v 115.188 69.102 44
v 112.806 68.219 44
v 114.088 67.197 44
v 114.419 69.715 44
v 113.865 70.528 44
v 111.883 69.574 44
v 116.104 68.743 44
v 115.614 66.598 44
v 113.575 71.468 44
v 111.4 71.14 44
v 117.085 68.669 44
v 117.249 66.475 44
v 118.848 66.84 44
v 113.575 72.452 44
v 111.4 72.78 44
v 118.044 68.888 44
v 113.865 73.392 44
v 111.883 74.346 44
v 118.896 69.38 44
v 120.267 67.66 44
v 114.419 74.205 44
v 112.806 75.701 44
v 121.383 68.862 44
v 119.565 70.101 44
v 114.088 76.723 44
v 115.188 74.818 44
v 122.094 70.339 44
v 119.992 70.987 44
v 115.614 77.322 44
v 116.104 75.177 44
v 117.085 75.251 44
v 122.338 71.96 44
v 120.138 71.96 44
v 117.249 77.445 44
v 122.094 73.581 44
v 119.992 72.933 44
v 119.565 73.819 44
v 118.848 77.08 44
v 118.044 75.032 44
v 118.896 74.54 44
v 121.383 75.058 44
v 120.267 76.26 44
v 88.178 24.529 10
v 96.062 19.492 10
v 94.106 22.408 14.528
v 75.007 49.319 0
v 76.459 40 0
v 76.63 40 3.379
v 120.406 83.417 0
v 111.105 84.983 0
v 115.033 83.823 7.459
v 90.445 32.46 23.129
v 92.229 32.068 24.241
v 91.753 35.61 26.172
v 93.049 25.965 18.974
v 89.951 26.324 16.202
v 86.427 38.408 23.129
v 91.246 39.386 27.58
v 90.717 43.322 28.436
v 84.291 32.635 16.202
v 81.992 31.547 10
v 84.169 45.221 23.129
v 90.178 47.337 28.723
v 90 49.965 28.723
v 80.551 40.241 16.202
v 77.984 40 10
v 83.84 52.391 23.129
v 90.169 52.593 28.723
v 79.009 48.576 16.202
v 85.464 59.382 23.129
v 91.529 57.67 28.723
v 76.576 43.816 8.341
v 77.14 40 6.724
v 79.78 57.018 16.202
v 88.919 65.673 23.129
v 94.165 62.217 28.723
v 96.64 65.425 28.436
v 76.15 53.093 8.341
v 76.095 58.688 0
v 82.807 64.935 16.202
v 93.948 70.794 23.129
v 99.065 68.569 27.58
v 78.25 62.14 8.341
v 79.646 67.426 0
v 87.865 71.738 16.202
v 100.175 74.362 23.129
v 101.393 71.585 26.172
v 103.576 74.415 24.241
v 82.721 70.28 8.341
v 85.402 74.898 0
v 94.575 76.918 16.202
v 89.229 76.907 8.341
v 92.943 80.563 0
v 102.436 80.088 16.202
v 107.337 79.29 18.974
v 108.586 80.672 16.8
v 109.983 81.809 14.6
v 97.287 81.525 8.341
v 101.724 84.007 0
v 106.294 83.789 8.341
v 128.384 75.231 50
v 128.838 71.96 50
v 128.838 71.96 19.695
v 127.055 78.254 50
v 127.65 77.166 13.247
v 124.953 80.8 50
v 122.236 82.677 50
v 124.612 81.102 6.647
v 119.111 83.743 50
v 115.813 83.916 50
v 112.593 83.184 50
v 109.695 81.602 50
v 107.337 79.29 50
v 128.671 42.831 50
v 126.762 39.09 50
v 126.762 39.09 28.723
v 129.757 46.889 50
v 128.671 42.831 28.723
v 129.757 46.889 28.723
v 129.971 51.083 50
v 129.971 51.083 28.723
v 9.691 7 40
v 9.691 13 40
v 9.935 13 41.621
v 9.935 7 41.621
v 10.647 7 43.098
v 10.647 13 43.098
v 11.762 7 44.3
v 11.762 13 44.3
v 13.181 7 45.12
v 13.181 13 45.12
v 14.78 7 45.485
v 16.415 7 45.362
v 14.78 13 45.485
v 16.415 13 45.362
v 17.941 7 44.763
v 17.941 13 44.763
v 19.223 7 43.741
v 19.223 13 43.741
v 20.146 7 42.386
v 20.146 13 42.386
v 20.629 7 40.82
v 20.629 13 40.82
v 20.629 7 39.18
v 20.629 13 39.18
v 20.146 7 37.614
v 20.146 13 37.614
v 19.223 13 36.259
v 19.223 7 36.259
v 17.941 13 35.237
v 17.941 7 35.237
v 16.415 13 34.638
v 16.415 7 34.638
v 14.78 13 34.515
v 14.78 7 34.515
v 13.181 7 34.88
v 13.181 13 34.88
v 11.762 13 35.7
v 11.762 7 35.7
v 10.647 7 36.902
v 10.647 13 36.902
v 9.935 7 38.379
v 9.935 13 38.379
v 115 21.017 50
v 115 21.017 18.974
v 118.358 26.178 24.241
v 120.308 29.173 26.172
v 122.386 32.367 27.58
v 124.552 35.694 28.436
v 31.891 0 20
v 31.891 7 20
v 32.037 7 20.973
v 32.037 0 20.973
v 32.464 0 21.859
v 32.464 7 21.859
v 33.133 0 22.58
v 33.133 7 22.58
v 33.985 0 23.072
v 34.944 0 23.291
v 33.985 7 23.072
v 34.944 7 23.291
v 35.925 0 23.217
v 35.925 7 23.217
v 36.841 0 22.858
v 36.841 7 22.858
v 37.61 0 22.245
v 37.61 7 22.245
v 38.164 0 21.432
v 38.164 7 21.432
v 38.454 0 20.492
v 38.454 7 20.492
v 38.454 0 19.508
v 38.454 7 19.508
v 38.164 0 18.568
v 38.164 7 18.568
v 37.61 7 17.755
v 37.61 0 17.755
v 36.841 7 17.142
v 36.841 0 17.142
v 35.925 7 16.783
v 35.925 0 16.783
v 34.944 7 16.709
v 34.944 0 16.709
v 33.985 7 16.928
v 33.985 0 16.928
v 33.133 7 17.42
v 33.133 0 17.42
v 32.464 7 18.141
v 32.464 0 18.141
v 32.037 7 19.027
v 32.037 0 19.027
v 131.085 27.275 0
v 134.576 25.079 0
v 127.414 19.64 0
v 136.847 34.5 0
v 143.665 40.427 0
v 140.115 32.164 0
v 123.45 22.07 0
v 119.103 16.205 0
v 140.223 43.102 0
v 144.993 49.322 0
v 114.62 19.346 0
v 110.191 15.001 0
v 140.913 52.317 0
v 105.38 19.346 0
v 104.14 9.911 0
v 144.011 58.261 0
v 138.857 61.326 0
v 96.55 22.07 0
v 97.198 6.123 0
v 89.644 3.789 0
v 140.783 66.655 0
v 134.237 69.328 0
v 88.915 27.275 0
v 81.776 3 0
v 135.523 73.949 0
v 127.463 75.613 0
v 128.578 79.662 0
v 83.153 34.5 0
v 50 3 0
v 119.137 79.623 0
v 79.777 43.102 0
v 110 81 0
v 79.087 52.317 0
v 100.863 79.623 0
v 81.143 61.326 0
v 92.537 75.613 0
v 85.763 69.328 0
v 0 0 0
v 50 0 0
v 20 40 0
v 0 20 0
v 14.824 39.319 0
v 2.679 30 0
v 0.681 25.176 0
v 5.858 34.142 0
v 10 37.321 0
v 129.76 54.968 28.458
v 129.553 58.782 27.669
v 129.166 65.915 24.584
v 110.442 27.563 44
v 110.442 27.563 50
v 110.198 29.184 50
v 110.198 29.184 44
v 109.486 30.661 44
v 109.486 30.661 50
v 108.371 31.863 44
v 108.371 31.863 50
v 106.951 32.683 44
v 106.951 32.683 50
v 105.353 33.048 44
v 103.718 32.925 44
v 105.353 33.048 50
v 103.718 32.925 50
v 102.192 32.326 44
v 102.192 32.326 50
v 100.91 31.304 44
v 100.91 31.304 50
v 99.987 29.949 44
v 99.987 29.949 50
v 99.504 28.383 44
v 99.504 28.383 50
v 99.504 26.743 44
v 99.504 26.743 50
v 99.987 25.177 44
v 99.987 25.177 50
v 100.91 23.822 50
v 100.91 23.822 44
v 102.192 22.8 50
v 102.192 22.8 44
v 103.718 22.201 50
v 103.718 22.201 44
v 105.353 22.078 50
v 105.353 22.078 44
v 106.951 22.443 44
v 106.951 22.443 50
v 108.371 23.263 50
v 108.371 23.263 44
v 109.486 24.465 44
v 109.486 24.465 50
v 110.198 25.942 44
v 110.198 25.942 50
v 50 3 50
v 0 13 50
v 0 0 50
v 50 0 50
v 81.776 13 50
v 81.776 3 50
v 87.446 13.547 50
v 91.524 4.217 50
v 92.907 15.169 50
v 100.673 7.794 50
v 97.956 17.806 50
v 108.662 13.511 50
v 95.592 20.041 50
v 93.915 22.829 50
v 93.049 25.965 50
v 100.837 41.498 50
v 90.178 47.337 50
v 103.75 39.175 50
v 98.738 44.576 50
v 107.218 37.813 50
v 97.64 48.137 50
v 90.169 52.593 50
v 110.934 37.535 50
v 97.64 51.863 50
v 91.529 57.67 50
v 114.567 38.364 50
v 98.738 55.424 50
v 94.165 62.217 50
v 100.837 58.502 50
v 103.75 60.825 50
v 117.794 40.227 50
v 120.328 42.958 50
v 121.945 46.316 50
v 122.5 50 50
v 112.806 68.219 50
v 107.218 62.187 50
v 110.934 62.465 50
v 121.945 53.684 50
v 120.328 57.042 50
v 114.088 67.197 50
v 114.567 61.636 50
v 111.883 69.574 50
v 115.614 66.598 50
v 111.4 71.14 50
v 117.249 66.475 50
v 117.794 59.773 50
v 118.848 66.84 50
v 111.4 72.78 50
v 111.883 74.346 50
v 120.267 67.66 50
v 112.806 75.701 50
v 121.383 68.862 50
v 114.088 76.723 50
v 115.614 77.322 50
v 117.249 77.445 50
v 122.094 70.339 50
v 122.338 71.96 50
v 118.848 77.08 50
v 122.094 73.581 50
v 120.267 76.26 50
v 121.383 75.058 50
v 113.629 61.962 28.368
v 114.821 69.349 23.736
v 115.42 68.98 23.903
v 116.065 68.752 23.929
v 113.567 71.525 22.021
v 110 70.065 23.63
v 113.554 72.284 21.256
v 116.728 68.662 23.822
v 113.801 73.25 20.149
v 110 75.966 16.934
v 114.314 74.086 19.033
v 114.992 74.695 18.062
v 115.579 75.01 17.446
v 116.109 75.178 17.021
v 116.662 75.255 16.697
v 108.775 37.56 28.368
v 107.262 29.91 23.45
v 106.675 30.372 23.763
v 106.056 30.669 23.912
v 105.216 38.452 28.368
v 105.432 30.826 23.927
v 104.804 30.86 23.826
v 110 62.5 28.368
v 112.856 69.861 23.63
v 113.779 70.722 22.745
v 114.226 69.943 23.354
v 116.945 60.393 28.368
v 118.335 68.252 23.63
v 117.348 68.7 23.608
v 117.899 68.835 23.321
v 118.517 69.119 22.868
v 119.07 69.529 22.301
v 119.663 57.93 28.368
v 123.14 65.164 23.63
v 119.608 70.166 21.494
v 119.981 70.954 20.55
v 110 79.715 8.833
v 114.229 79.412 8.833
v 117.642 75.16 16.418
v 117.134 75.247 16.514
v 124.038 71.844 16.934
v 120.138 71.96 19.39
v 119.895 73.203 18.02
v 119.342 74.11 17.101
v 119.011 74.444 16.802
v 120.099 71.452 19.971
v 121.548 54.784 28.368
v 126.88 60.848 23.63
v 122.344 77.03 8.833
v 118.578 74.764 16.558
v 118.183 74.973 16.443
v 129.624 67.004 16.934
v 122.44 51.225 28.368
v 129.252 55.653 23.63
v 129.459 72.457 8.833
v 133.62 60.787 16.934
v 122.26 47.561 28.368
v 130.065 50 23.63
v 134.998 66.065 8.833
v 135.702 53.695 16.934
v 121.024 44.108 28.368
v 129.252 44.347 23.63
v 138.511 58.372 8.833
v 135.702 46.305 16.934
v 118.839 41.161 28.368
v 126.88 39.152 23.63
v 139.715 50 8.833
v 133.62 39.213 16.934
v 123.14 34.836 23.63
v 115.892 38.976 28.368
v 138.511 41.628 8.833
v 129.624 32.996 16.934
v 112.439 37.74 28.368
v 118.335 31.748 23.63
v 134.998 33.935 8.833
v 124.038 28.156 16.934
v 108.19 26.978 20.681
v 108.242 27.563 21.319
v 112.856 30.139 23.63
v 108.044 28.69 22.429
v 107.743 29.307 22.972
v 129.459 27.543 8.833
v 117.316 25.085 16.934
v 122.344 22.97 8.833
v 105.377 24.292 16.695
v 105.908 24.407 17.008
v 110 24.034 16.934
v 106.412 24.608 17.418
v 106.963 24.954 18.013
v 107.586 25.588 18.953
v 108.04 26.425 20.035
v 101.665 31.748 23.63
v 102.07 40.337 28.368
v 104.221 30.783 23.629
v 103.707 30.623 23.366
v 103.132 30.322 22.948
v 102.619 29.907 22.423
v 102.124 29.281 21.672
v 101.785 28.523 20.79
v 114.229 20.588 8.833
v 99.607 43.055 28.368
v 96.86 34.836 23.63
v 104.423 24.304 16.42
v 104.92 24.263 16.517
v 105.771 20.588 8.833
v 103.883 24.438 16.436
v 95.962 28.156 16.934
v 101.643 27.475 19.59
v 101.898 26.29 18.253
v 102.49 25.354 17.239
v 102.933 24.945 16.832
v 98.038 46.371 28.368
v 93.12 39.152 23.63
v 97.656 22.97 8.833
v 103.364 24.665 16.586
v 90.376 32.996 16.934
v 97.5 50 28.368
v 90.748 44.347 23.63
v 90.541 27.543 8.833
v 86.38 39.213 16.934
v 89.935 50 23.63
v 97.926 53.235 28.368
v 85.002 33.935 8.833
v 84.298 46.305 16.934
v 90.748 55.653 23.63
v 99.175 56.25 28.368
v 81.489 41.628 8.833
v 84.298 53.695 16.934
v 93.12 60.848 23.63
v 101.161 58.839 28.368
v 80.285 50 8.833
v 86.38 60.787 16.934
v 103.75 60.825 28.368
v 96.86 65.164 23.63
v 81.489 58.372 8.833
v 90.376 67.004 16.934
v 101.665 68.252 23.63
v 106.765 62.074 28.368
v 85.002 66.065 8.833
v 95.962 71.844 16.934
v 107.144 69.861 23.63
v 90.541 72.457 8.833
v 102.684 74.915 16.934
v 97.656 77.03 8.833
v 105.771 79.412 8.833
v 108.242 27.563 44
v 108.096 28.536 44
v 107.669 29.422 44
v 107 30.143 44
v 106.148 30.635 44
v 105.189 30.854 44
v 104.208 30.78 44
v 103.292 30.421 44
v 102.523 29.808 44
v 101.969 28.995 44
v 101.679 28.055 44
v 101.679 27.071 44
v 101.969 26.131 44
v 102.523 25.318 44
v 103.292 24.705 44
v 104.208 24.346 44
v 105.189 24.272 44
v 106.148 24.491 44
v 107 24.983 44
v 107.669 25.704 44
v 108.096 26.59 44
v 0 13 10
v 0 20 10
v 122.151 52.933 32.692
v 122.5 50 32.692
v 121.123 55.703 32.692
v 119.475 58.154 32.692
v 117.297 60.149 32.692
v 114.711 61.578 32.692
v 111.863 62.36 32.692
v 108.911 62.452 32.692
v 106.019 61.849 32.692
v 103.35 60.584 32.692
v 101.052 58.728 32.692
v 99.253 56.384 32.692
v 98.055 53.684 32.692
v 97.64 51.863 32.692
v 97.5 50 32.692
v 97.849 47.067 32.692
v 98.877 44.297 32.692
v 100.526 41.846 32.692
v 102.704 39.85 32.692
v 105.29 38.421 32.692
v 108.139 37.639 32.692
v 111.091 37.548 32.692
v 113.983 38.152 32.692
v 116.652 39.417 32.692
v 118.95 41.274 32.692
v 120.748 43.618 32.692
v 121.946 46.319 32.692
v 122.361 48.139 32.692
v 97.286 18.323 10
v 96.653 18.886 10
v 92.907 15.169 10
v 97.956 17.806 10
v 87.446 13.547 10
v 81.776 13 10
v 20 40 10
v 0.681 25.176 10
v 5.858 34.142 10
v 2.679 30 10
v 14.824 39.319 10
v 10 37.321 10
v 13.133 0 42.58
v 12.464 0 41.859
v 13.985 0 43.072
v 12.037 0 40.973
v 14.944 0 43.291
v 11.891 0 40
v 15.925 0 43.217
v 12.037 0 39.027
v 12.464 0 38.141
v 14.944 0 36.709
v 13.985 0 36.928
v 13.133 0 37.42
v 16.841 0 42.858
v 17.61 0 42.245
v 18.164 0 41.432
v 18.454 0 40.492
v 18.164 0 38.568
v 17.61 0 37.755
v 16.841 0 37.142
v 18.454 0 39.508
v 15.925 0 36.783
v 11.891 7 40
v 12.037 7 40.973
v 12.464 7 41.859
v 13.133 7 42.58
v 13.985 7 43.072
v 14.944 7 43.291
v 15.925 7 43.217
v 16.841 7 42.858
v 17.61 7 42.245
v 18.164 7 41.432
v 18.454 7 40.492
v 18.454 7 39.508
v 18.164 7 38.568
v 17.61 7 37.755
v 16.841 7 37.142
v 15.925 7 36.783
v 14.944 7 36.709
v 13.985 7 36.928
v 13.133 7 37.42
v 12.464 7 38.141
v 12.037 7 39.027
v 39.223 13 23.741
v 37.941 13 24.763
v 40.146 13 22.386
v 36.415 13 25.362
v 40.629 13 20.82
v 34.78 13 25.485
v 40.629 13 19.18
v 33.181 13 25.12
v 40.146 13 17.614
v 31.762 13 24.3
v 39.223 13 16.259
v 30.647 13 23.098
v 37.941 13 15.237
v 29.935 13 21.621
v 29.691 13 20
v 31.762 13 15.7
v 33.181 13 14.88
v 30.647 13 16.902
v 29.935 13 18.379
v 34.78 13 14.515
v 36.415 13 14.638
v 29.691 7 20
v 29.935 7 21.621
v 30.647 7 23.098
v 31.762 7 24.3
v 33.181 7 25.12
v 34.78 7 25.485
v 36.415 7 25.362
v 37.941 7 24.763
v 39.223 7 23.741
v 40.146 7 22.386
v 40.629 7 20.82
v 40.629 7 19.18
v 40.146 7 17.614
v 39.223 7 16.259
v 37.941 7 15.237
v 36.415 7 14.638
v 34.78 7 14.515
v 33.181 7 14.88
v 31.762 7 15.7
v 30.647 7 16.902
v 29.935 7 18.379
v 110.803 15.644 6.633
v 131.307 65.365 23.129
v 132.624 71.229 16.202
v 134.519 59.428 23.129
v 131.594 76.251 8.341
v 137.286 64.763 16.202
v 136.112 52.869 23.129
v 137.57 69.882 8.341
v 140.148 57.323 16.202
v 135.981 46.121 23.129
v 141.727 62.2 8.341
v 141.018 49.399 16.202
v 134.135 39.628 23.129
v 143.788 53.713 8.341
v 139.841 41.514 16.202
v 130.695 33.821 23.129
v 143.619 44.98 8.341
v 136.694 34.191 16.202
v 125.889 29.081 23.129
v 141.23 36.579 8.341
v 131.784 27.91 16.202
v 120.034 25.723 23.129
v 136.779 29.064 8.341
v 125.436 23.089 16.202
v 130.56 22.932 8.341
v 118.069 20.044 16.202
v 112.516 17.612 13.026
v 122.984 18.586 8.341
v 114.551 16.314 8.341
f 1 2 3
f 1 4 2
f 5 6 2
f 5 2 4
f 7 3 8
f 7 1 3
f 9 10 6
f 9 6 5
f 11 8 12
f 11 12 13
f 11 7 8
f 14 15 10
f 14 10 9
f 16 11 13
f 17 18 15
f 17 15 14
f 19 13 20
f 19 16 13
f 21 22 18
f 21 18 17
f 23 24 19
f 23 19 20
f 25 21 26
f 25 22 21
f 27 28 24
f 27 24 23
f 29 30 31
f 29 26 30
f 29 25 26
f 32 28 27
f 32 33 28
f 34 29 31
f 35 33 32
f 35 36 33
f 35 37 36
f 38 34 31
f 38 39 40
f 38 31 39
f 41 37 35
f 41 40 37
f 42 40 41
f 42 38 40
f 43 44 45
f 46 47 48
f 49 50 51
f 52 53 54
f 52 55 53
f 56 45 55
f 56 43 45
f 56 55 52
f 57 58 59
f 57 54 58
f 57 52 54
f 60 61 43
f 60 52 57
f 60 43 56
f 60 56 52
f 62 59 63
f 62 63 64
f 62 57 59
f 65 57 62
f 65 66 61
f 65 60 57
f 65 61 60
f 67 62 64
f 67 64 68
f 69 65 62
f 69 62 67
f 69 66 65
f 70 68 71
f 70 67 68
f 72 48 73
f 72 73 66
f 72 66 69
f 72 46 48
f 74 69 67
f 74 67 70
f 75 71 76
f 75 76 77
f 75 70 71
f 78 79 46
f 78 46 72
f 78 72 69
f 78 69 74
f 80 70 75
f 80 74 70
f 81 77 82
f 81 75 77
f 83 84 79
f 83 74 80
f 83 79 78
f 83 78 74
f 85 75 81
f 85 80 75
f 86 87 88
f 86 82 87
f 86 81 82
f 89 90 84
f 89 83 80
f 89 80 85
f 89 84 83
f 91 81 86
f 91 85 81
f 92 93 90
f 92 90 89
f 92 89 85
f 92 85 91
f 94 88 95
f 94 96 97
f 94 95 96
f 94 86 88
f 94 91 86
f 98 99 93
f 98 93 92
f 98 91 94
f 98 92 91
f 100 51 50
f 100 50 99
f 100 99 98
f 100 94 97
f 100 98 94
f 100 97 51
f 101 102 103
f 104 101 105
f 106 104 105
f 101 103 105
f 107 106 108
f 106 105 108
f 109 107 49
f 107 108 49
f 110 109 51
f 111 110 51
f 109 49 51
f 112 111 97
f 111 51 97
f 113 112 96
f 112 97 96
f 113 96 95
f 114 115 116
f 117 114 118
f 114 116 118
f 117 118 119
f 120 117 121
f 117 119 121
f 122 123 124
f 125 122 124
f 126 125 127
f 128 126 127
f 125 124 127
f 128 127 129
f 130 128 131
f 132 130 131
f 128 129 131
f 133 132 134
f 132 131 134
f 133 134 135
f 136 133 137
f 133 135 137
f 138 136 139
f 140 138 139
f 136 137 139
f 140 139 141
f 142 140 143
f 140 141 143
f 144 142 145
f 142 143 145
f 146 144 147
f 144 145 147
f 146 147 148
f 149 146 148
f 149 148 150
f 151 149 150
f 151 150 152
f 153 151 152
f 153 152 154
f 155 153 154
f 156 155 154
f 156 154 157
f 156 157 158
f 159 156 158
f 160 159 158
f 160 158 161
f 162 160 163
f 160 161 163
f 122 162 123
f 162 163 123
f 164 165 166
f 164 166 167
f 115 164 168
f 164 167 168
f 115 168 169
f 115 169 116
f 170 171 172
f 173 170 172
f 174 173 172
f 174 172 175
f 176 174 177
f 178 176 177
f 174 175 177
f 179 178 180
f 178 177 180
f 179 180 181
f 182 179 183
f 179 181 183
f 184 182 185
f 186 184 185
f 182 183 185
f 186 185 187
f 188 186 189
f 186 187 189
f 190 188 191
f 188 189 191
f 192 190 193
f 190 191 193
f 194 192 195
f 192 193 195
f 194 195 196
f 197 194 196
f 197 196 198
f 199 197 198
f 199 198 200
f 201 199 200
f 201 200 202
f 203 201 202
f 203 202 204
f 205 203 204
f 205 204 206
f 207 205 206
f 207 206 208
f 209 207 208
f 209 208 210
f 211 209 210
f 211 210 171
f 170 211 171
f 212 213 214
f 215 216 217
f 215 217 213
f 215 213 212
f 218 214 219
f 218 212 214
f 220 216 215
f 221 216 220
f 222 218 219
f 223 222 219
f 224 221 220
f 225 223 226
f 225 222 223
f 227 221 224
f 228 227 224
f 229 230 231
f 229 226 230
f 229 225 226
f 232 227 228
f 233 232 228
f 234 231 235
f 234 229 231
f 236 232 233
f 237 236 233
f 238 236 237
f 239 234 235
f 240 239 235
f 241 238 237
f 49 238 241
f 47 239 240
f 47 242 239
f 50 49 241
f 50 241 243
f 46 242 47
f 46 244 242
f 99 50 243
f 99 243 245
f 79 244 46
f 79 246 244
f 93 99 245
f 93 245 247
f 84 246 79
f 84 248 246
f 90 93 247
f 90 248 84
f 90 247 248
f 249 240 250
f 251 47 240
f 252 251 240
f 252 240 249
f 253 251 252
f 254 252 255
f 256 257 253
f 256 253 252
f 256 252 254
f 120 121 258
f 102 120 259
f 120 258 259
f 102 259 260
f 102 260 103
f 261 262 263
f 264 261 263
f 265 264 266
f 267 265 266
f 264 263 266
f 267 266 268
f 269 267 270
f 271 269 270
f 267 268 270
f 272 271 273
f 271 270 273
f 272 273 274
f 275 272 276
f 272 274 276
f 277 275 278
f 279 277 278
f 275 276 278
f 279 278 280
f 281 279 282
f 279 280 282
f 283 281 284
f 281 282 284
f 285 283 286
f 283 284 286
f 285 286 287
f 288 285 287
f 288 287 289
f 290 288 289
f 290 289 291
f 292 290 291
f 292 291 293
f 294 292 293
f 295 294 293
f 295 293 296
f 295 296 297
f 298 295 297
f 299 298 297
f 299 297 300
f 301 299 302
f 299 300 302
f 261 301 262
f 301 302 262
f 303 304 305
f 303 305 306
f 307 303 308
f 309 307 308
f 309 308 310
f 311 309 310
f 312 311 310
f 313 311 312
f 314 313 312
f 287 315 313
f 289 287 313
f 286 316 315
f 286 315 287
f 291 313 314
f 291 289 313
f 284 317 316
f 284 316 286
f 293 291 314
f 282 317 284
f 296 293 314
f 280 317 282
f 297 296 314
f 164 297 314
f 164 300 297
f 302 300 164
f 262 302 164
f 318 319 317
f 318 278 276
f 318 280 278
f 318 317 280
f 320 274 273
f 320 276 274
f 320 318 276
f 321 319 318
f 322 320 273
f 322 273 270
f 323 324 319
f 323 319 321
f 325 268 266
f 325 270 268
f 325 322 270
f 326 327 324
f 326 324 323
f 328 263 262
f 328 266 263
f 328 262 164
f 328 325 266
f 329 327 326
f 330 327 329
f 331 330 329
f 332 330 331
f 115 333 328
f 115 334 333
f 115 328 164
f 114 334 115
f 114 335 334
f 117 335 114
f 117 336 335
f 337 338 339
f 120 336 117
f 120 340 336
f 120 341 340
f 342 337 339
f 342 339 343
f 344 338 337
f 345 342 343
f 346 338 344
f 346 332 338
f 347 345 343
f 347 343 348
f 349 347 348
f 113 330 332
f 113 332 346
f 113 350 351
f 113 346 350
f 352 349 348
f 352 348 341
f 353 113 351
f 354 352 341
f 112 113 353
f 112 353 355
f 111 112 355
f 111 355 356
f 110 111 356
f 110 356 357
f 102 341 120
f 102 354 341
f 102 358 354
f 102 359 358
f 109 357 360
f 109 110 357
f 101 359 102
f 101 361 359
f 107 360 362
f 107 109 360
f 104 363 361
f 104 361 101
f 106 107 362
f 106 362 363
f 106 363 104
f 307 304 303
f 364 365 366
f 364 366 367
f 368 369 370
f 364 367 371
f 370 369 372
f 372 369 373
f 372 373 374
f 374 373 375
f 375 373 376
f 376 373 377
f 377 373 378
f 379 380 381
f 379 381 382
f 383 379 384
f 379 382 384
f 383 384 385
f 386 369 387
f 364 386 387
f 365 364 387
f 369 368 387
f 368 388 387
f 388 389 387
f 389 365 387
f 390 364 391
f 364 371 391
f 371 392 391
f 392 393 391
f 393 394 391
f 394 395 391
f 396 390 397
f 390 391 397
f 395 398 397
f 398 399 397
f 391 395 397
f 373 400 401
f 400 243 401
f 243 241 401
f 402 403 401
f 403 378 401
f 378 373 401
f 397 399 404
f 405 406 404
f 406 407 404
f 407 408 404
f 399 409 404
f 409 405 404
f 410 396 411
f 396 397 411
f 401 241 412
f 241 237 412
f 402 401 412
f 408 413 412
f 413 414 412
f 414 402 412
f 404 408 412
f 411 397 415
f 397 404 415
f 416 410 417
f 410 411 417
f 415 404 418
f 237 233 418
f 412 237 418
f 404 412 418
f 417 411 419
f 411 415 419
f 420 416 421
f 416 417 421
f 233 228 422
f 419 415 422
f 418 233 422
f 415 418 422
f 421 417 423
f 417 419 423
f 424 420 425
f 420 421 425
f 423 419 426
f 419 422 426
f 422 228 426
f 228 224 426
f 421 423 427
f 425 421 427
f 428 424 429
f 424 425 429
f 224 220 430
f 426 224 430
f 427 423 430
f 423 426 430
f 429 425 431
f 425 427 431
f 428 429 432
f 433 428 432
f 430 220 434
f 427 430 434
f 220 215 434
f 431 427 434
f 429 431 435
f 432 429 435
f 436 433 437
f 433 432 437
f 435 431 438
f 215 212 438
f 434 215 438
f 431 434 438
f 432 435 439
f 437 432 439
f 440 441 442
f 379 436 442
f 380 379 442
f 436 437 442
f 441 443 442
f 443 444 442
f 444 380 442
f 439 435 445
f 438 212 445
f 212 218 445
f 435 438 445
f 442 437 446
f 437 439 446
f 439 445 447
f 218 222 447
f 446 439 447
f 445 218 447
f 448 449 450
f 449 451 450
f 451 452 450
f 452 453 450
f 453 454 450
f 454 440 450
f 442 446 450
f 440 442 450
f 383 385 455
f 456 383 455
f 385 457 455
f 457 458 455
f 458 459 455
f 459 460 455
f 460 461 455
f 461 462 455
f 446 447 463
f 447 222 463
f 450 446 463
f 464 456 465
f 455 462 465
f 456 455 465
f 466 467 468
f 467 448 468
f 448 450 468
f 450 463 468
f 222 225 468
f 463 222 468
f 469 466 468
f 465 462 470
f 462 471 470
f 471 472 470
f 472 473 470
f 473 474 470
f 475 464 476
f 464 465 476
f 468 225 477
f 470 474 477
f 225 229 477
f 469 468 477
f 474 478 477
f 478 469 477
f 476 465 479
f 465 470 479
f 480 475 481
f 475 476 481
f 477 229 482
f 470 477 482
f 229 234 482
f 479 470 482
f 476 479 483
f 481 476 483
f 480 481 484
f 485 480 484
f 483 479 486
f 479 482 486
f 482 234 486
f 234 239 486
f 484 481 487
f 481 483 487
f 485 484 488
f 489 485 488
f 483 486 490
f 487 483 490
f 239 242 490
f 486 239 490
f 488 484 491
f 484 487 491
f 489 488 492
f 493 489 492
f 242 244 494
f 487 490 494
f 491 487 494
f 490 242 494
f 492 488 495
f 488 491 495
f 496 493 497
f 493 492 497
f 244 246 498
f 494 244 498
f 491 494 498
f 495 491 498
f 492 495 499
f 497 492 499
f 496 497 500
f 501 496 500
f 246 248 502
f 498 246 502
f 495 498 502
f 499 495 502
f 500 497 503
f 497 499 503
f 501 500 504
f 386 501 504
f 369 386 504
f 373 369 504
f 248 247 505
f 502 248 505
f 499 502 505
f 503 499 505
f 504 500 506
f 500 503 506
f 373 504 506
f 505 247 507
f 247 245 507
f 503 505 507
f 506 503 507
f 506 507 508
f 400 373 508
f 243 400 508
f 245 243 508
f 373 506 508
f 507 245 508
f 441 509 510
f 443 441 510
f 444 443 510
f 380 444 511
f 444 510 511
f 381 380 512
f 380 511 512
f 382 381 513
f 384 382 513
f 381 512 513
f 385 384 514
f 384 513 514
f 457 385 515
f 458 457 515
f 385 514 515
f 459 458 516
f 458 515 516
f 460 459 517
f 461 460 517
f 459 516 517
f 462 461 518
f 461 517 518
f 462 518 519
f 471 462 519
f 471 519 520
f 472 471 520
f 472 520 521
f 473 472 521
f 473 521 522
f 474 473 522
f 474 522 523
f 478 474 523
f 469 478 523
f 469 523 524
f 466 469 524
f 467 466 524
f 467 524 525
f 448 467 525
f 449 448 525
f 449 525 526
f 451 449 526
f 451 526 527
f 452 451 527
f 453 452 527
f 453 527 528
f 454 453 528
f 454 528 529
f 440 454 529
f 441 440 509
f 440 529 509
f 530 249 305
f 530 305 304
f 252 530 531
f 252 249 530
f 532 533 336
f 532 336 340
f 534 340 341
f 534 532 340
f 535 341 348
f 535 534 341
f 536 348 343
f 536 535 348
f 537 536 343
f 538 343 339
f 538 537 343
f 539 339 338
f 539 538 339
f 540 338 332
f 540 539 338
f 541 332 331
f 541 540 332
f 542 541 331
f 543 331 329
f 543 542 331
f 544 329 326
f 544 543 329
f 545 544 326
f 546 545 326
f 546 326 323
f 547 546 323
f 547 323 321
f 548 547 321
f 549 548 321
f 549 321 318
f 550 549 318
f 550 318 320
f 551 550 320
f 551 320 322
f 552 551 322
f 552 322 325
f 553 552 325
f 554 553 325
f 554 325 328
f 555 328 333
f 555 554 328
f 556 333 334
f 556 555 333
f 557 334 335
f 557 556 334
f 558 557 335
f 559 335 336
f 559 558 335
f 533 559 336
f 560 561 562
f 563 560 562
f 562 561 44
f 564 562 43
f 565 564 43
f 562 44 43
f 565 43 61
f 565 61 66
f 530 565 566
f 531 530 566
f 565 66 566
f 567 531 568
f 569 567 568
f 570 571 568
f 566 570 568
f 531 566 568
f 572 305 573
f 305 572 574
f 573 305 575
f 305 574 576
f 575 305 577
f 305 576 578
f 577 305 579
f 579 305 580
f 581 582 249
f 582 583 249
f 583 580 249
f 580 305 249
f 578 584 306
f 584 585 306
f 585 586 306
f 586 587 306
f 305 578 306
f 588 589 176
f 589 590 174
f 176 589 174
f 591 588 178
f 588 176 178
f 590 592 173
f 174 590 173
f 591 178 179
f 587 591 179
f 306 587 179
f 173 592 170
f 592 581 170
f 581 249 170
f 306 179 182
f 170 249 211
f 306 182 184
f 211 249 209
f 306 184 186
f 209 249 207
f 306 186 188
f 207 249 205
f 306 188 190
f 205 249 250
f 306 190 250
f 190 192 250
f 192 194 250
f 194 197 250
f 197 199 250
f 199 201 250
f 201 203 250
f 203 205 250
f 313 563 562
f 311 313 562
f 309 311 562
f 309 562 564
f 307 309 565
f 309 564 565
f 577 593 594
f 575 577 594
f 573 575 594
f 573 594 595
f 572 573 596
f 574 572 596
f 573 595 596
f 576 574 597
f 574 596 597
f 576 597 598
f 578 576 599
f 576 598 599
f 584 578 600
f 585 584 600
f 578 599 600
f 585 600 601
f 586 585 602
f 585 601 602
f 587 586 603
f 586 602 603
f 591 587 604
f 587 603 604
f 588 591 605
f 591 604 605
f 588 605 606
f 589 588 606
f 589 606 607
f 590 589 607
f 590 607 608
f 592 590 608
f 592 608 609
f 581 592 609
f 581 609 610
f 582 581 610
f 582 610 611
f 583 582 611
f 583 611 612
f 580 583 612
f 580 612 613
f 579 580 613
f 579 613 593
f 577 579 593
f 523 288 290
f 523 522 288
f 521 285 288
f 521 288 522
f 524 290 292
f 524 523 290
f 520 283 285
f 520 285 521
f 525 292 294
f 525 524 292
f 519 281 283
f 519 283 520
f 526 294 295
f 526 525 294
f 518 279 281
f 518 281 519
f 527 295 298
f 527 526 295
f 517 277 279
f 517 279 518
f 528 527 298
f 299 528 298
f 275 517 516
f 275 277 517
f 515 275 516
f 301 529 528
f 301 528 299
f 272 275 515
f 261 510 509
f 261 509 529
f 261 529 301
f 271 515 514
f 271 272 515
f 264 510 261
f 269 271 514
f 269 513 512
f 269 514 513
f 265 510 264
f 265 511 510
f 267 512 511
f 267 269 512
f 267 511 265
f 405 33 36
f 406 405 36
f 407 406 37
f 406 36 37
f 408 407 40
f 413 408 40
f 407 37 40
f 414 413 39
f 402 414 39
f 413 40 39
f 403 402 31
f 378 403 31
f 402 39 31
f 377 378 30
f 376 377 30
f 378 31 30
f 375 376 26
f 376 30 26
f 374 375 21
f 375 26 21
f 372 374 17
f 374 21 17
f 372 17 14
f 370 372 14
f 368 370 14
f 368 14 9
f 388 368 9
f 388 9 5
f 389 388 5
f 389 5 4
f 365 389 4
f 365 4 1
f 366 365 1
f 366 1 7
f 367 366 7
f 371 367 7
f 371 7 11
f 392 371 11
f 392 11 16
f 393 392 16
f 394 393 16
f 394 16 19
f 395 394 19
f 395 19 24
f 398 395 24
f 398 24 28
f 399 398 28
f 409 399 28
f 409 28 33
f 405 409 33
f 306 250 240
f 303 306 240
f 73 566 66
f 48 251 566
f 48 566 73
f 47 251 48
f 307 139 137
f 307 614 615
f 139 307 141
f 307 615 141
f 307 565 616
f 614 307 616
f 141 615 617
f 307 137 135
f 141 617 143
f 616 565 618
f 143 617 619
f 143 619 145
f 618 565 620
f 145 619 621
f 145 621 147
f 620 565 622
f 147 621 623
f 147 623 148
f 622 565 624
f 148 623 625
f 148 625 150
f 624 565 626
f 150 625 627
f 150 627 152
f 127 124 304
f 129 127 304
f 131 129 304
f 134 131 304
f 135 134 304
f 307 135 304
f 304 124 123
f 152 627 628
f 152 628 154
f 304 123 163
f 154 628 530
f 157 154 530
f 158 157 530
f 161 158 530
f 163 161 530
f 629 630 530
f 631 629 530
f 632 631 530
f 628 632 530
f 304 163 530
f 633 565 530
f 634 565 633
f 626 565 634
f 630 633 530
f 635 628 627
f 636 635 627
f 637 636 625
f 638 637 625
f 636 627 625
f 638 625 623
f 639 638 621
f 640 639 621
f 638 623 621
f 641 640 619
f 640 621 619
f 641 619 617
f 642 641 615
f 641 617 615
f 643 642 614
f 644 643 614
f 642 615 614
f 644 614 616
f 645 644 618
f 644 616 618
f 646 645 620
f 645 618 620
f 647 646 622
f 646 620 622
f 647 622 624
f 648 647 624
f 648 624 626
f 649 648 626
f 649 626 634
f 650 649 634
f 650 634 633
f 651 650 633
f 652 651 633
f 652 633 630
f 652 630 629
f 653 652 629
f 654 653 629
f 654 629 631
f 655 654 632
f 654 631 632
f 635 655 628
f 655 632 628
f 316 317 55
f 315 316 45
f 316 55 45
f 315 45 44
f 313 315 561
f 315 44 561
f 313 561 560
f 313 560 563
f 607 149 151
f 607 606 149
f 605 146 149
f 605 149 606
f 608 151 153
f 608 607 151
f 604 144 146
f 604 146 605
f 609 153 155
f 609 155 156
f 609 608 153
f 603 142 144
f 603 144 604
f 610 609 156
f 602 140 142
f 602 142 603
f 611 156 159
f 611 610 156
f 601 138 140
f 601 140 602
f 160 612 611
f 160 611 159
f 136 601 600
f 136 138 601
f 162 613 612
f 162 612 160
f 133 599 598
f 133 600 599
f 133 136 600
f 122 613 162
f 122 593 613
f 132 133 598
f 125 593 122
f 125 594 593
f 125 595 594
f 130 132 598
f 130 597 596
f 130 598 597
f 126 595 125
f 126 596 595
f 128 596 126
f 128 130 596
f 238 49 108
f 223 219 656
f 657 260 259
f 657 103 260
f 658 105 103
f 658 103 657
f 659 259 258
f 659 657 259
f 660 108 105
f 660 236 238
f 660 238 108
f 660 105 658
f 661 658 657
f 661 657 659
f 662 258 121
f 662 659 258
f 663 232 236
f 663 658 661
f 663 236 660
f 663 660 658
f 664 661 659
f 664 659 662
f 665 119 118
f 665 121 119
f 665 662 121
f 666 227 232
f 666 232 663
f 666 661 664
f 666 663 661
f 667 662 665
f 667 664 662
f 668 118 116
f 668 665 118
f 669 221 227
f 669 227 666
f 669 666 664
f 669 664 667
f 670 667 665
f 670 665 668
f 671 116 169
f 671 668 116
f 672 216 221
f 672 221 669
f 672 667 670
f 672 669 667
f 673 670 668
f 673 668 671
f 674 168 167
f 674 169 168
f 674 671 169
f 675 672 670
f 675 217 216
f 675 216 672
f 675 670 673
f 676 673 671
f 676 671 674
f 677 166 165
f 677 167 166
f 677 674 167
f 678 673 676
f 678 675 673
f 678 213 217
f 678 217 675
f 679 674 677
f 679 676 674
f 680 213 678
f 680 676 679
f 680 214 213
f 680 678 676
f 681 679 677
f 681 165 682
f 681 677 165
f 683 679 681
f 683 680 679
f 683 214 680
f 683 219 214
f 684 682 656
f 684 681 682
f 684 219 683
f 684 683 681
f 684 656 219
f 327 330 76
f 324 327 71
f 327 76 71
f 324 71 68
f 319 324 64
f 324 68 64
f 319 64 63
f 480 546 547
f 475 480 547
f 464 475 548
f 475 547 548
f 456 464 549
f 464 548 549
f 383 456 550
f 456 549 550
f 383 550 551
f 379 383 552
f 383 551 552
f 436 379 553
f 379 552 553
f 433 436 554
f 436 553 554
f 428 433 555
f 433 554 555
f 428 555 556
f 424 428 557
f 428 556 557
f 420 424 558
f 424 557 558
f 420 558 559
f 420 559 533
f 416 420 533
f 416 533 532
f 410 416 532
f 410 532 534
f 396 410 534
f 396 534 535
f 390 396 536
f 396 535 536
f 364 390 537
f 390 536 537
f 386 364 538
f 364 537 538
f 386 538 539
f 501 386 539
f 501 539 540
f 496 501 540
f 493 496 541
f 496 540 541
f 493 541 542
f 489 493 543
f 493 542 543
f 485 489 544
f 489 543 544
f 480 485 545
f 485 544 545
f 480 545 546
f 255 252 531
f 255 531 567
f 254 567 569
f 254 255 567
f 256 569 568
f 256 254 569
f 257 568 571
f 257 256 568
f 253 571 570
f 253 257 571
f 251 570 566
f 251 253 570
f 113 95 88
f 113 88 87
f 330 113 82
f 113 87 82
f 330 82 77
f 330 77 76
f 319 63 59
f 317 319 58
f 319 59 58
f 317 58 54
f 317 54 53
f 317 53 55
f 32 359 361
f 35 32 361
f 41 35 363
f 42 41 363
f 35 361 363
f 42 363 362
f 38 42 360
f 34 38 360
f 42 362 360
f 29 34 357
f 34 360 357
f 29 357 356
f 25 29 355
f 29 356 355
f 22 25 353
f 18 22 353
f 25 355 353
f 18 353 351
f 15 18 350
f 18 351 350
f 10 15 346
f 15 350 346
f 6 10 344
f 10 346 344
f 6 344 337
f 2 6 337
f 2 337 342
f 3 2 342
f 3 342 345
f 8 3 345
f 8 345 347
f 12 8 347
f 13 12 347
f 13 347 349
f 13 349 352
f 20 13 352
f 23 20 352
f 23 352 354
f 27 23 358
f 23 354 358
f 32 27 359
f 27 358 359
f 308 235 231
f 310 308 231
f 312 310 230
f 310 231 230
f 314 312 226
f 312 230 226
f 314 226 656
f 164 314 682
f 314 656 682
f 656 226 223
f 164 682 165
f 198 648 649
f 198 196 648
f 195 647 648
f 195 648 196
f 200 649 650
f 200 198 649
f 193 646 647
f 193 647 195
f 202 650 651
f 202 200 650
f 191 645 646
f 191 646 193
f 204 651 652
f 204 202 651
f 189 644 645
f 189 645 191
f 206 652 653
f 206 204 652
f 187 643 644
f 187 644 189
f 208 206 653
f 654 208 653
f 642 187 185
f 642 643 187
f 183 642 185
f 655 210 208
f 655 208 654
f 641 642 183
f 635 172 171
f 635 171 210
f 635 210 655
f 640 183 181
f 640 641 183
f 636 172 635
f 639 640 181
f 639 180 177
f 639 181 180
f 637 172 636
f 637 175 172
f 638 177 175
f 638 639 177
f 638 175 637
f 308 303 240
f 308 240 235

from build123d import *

# Parameters (mm, degrees)
SKETCH1_R               = 12.5
SKETCH1_R_2             = 5.5
BOSS_EXTRUDE1_DEPTH     = 50
SKETCH3_R               = 5.5
CUT_EXTRUDE2_DEPTH      = 6
BOSS_EXTRUDE2_DEPTH     = 10
CUT_EXTRUDE3_REACH      = 177.357
CUT_EXTRUDE3_END_RADIUS = 31
SKETCH8_R               = 12.5
SKETCH8_R_2             = 3.3
SKETCH9_R               = 5.5
CUT_EXTRUDE4_DEPTH      = 6
SKETCH11_R              = 3.3
CUT_EXTRUDE5_DEPTH      = 170.437304068


with BuildPart() as part:
    # Sketch1 → Boss-Extrude1 (new body)
    # profile 1 of 3: a face of its own
    with BuildSketch(Plane.XY):
        with BuildLine():
            ThreePointArc((93.048941287, 25.965408086), (94.65877554, 21.378133023), (97.956410185, 17.805981771))
            ThreePointArc((97.956410185, 17.805981771), (90.215500805, 14.226887077), (81.775930618, 13))
            Line((81.775930618, 13), (0, 13))
            Line((0, 13), (0, 0))
            Line((0, 0), (50, 0))
            Line((50, 0), (50, 3))
            Line((50, 3), (81.775930618, 3))
            ThreePointArc((81.775930618, 3), (100.673195021, 7.794200226), (114.99953828, 21.017166857))
            Line((114.99953828, 21.017166857), (126.762369546, 39.090235236))
            ThreePointArc((126.762369546, 39.090235236), (129.32062945, 44.831511086), (129.970641881, 51.083264917))
            Line((129.970641881, 51.083264917), (128.838231587, 71.959931438))
            ThreePointArc((128.838231587, 71.959931438), (120.710453355, 83.318007797), (107.33724849, 79.290096524))
            Line((107.33724849, 79.290096524), (94.165028172, 62.21694181))
            ThreePointArc((94.165028172, 62.21694181), (90.681483474, 55.176380902), (90.178041223, 47.33730395))
            Line((90.178041223, 47.33730395), (93.048941287, 25.965408086))
        make_face()
        with Locations((110, 50)):
            Circle(SKETCH1_R, mode=Mode.SUBTRACT)
        with Locations((116.838231587, 71.959931438)):
            Circle(SKETCH1_R_2, mode=Mode.SUBTRACT)
        with Locations((104.942116553, 27.563025716)):
            Circle(SKETCH1_R_2, mode=Mode.SUBTRACT)
    # profile 2 of 3: a face of its own
    with BuildSketch(Plane.XY):
        with Locations((116.838231587, 71.959931438)):
            Circle(SKETCH1_R_2)
    # profile 3 of 3: a face of its own
    with BuildSketch(Plane.XY):
        with Locations((104.942116553, 27.563025716)):
            Circle(SKETCH1_R_2)
    extrude(amount=BOSS_EXTRUDE1_DEPTH)

    # Sketch3 → Cut-Extrude2 (cut)
    with BuildSketch(Plane.XY.offset(50)):
        with Locations((116.838231587, 71.959931438)):
            Circle(SKETCH3_R)
        with Locations((104.942116553, 27.563025716)):
            Circle(SKETCH3_R)
    extrude(amount=-CUT_EXTRUDE2_DEPTH, mode=Mode.SUBTRACT)

    # Sketch5 → Boss-Extrude2 (add)
    with BuildSketch(Plane(origin=(0, 0, 0), x_dir=(-1, 0, 0), z_dir=(0, 0, -1))):
        with BuildLine():
            Line((-81.775930618, 13), (0, 13))
            Line((0, 13), (0, 20))
            ThreePointArc((0, 20), (-5.857864376, 34.142135624), (-20, 40))
            Line((-20, 40), (-76.458980338, 40))
            Line((-76.458980338, 40), (-80.657198498, 40))
            Line((-80.657198498, 40), (-91.163665826, 40))
            Line((-91.163665826, 40), (-93.048941287, 25.965408086))
            ThreePointArc((-93.048941287, 25.965408086), (-94.65877554, 21.378133023), (-97.956410185, 17.805981771))
            ThreePointArc((-97.956410185, 17.805981771), (-90.215500805, 14.226887077), (-81.775930618, 13))
        make_face()
    extrude(amount=-BOSS_EXTRUDE2_DEPTH)

    # Sketch6 → Revolve2 (revolve)
    with BuildSketch(Plane.ZY.offset(-110), mode=Mode.PRIVATE) as revolve2_sk:
        with BuildLine():
            ThreePointArc((31, 50), (21.920310217, 71.920310217), (0, 81))
            Line((0, 81), (0, 50))
            Line((0, 50), (31, 50))
        make_face()
        with BuildLine():
            Line((0, 85), (0, 81))
            ThreePointArc((0, 81), (21.920310217, 71.920310217), (31, 50))
            Line((31, 50), (35, 50))
            ThreePointArc((35, 50), (24.748737342, 74.748737342), (0, 85))
        make_face()
    revolve(revolve2_sk.sketch.rotate(Axis((110, 50, 35), (0, 0, -1)), 270), axis=Axis((110, 50, 35), (0, 0, -1)))

    # Sketch6<5> → Cut-Revolve3 (revolve, cut)
    with BuildSketch(Plane.ZY.offset(-110)):
        with BuildLine():
            ThreePointArc((31, 50), (21.920310217, 71.920310217), (0, 81))
            Line((0, 81), (0, 50))
            Line((0, 50), (31, 50))
        make_face()
    revolve(axis=Axis((110, 50, 35), (0, 0, -1)), mode=Mode.SUBTRACT)

    # Cut-Extrude3: up to this sphere (the profile starts outside it)
    cut_extrude3_end = Location((110, 50, 0)) * Sphere(CUT_EXTRUDE3_END_RADIUS, mode=Mode.PRIVATE)
    # Sketch8 → Cut-Extrude3 (cut, up to the surface)
    with BuildSketch(Plane.XY.offset(50), mode=Mode.PRIVATE) as cut_extrude3_sk1:
        with Locations(Location((110, 50, 0), (0, 0, 180))):
            Circle(SKETCH8_R)
    cut_extrude3_tool1 = extrude(cut_extrude3_sk1.sketch, amount=-CUT_EXTRUDE3_REACH, mode=Mode.PRIVATE) - cut_extrude3_end
    add(cut_extrude3_tool1.solids().sort_by_distance((110, 50, 50))[0], mode=Mode.SUBTRACT)
    # Sketch8 → Cut-Extrude3 (cut, up to the surface)
    with BuildSketch(Plane.XY.offset(50), mode=Mode.PRIVATE) as cut_extrude3_sk2:
        with Locations((116.838231587, 71.959931438)):
            Circle(SKETCH8_R_2)
    cut_extrude3_tool2 = extrude(cut_extrude3_sk2.sketch, amount=-CUT_EXTRUDE3_REACH, mode=Mode.PRIVATE) - cut_extrude3_end
    add(cut_extrude3_tool2.solids().sort_by_distance((116.838232, 71.959931, 50))[0], mode=Mode.SUBTRACT)
    # Sketch8 → Cut-Extrude3 (cut, up to the surface)
    with BuildSketch(Plane.XY.offset(50), mode=Mode.PRIVATE) as cut_extrude3_sk3:
        with Locations((104.942116553, 27.563025716)):
            Circle(SKETCH8_R_2)
    cut_extrude3_tool3 = extrude(cut_extrude3_sk3.sketch, amount=-CUT_EXTRUDE3_REACH, mode=Mode.PRIVATE) - cut_extrude3_end
    add(cut_extrude3_tool3.solids().sort_by_distance((104.942117, 27.563026, 50))[0], mode=Mode.SUBTRACT)

    # Sketch9 → Cut-Extrude4 (cut)
    with BuildSketch(Plane(origin=(0, 13, 0), x_dir=(1, 0, 0), z_dir=(0, 1, 0))):
        with Locations(Location((15.190815531, -40, 0), (0, 0, 180))):
            Circle(SKETCH9_R)
        with Locations(Location((35.190815531, -20, 0), (0, 0, 180))):
            Circle(SKETCH9_R)
    extrude(amount=-CUT_EXTRUDE4_DEPTH, mode=Mode.SUBTRACT)

    # Sketch11 → Cut-Extrude5 (cut, through all)
    with BuildSketch(Plane(origin=(0, 13, 0), x_dir=(1, 0, 0), z_dir=(0, 1, 0))):
        with Locations(Location((35.190815531, -20, 0), (0, 0, 180))):
            Circle(SKETCH11_R)
        with Locations(Location((15.190815531, -40, 0), (0, 0, 180))):
            Circle(SKETCH11_R)
    extrude(amount=-CUT_EXTRUDE5_DEPTH, mode=Mode.SUBTRACT)


solid = part.part
